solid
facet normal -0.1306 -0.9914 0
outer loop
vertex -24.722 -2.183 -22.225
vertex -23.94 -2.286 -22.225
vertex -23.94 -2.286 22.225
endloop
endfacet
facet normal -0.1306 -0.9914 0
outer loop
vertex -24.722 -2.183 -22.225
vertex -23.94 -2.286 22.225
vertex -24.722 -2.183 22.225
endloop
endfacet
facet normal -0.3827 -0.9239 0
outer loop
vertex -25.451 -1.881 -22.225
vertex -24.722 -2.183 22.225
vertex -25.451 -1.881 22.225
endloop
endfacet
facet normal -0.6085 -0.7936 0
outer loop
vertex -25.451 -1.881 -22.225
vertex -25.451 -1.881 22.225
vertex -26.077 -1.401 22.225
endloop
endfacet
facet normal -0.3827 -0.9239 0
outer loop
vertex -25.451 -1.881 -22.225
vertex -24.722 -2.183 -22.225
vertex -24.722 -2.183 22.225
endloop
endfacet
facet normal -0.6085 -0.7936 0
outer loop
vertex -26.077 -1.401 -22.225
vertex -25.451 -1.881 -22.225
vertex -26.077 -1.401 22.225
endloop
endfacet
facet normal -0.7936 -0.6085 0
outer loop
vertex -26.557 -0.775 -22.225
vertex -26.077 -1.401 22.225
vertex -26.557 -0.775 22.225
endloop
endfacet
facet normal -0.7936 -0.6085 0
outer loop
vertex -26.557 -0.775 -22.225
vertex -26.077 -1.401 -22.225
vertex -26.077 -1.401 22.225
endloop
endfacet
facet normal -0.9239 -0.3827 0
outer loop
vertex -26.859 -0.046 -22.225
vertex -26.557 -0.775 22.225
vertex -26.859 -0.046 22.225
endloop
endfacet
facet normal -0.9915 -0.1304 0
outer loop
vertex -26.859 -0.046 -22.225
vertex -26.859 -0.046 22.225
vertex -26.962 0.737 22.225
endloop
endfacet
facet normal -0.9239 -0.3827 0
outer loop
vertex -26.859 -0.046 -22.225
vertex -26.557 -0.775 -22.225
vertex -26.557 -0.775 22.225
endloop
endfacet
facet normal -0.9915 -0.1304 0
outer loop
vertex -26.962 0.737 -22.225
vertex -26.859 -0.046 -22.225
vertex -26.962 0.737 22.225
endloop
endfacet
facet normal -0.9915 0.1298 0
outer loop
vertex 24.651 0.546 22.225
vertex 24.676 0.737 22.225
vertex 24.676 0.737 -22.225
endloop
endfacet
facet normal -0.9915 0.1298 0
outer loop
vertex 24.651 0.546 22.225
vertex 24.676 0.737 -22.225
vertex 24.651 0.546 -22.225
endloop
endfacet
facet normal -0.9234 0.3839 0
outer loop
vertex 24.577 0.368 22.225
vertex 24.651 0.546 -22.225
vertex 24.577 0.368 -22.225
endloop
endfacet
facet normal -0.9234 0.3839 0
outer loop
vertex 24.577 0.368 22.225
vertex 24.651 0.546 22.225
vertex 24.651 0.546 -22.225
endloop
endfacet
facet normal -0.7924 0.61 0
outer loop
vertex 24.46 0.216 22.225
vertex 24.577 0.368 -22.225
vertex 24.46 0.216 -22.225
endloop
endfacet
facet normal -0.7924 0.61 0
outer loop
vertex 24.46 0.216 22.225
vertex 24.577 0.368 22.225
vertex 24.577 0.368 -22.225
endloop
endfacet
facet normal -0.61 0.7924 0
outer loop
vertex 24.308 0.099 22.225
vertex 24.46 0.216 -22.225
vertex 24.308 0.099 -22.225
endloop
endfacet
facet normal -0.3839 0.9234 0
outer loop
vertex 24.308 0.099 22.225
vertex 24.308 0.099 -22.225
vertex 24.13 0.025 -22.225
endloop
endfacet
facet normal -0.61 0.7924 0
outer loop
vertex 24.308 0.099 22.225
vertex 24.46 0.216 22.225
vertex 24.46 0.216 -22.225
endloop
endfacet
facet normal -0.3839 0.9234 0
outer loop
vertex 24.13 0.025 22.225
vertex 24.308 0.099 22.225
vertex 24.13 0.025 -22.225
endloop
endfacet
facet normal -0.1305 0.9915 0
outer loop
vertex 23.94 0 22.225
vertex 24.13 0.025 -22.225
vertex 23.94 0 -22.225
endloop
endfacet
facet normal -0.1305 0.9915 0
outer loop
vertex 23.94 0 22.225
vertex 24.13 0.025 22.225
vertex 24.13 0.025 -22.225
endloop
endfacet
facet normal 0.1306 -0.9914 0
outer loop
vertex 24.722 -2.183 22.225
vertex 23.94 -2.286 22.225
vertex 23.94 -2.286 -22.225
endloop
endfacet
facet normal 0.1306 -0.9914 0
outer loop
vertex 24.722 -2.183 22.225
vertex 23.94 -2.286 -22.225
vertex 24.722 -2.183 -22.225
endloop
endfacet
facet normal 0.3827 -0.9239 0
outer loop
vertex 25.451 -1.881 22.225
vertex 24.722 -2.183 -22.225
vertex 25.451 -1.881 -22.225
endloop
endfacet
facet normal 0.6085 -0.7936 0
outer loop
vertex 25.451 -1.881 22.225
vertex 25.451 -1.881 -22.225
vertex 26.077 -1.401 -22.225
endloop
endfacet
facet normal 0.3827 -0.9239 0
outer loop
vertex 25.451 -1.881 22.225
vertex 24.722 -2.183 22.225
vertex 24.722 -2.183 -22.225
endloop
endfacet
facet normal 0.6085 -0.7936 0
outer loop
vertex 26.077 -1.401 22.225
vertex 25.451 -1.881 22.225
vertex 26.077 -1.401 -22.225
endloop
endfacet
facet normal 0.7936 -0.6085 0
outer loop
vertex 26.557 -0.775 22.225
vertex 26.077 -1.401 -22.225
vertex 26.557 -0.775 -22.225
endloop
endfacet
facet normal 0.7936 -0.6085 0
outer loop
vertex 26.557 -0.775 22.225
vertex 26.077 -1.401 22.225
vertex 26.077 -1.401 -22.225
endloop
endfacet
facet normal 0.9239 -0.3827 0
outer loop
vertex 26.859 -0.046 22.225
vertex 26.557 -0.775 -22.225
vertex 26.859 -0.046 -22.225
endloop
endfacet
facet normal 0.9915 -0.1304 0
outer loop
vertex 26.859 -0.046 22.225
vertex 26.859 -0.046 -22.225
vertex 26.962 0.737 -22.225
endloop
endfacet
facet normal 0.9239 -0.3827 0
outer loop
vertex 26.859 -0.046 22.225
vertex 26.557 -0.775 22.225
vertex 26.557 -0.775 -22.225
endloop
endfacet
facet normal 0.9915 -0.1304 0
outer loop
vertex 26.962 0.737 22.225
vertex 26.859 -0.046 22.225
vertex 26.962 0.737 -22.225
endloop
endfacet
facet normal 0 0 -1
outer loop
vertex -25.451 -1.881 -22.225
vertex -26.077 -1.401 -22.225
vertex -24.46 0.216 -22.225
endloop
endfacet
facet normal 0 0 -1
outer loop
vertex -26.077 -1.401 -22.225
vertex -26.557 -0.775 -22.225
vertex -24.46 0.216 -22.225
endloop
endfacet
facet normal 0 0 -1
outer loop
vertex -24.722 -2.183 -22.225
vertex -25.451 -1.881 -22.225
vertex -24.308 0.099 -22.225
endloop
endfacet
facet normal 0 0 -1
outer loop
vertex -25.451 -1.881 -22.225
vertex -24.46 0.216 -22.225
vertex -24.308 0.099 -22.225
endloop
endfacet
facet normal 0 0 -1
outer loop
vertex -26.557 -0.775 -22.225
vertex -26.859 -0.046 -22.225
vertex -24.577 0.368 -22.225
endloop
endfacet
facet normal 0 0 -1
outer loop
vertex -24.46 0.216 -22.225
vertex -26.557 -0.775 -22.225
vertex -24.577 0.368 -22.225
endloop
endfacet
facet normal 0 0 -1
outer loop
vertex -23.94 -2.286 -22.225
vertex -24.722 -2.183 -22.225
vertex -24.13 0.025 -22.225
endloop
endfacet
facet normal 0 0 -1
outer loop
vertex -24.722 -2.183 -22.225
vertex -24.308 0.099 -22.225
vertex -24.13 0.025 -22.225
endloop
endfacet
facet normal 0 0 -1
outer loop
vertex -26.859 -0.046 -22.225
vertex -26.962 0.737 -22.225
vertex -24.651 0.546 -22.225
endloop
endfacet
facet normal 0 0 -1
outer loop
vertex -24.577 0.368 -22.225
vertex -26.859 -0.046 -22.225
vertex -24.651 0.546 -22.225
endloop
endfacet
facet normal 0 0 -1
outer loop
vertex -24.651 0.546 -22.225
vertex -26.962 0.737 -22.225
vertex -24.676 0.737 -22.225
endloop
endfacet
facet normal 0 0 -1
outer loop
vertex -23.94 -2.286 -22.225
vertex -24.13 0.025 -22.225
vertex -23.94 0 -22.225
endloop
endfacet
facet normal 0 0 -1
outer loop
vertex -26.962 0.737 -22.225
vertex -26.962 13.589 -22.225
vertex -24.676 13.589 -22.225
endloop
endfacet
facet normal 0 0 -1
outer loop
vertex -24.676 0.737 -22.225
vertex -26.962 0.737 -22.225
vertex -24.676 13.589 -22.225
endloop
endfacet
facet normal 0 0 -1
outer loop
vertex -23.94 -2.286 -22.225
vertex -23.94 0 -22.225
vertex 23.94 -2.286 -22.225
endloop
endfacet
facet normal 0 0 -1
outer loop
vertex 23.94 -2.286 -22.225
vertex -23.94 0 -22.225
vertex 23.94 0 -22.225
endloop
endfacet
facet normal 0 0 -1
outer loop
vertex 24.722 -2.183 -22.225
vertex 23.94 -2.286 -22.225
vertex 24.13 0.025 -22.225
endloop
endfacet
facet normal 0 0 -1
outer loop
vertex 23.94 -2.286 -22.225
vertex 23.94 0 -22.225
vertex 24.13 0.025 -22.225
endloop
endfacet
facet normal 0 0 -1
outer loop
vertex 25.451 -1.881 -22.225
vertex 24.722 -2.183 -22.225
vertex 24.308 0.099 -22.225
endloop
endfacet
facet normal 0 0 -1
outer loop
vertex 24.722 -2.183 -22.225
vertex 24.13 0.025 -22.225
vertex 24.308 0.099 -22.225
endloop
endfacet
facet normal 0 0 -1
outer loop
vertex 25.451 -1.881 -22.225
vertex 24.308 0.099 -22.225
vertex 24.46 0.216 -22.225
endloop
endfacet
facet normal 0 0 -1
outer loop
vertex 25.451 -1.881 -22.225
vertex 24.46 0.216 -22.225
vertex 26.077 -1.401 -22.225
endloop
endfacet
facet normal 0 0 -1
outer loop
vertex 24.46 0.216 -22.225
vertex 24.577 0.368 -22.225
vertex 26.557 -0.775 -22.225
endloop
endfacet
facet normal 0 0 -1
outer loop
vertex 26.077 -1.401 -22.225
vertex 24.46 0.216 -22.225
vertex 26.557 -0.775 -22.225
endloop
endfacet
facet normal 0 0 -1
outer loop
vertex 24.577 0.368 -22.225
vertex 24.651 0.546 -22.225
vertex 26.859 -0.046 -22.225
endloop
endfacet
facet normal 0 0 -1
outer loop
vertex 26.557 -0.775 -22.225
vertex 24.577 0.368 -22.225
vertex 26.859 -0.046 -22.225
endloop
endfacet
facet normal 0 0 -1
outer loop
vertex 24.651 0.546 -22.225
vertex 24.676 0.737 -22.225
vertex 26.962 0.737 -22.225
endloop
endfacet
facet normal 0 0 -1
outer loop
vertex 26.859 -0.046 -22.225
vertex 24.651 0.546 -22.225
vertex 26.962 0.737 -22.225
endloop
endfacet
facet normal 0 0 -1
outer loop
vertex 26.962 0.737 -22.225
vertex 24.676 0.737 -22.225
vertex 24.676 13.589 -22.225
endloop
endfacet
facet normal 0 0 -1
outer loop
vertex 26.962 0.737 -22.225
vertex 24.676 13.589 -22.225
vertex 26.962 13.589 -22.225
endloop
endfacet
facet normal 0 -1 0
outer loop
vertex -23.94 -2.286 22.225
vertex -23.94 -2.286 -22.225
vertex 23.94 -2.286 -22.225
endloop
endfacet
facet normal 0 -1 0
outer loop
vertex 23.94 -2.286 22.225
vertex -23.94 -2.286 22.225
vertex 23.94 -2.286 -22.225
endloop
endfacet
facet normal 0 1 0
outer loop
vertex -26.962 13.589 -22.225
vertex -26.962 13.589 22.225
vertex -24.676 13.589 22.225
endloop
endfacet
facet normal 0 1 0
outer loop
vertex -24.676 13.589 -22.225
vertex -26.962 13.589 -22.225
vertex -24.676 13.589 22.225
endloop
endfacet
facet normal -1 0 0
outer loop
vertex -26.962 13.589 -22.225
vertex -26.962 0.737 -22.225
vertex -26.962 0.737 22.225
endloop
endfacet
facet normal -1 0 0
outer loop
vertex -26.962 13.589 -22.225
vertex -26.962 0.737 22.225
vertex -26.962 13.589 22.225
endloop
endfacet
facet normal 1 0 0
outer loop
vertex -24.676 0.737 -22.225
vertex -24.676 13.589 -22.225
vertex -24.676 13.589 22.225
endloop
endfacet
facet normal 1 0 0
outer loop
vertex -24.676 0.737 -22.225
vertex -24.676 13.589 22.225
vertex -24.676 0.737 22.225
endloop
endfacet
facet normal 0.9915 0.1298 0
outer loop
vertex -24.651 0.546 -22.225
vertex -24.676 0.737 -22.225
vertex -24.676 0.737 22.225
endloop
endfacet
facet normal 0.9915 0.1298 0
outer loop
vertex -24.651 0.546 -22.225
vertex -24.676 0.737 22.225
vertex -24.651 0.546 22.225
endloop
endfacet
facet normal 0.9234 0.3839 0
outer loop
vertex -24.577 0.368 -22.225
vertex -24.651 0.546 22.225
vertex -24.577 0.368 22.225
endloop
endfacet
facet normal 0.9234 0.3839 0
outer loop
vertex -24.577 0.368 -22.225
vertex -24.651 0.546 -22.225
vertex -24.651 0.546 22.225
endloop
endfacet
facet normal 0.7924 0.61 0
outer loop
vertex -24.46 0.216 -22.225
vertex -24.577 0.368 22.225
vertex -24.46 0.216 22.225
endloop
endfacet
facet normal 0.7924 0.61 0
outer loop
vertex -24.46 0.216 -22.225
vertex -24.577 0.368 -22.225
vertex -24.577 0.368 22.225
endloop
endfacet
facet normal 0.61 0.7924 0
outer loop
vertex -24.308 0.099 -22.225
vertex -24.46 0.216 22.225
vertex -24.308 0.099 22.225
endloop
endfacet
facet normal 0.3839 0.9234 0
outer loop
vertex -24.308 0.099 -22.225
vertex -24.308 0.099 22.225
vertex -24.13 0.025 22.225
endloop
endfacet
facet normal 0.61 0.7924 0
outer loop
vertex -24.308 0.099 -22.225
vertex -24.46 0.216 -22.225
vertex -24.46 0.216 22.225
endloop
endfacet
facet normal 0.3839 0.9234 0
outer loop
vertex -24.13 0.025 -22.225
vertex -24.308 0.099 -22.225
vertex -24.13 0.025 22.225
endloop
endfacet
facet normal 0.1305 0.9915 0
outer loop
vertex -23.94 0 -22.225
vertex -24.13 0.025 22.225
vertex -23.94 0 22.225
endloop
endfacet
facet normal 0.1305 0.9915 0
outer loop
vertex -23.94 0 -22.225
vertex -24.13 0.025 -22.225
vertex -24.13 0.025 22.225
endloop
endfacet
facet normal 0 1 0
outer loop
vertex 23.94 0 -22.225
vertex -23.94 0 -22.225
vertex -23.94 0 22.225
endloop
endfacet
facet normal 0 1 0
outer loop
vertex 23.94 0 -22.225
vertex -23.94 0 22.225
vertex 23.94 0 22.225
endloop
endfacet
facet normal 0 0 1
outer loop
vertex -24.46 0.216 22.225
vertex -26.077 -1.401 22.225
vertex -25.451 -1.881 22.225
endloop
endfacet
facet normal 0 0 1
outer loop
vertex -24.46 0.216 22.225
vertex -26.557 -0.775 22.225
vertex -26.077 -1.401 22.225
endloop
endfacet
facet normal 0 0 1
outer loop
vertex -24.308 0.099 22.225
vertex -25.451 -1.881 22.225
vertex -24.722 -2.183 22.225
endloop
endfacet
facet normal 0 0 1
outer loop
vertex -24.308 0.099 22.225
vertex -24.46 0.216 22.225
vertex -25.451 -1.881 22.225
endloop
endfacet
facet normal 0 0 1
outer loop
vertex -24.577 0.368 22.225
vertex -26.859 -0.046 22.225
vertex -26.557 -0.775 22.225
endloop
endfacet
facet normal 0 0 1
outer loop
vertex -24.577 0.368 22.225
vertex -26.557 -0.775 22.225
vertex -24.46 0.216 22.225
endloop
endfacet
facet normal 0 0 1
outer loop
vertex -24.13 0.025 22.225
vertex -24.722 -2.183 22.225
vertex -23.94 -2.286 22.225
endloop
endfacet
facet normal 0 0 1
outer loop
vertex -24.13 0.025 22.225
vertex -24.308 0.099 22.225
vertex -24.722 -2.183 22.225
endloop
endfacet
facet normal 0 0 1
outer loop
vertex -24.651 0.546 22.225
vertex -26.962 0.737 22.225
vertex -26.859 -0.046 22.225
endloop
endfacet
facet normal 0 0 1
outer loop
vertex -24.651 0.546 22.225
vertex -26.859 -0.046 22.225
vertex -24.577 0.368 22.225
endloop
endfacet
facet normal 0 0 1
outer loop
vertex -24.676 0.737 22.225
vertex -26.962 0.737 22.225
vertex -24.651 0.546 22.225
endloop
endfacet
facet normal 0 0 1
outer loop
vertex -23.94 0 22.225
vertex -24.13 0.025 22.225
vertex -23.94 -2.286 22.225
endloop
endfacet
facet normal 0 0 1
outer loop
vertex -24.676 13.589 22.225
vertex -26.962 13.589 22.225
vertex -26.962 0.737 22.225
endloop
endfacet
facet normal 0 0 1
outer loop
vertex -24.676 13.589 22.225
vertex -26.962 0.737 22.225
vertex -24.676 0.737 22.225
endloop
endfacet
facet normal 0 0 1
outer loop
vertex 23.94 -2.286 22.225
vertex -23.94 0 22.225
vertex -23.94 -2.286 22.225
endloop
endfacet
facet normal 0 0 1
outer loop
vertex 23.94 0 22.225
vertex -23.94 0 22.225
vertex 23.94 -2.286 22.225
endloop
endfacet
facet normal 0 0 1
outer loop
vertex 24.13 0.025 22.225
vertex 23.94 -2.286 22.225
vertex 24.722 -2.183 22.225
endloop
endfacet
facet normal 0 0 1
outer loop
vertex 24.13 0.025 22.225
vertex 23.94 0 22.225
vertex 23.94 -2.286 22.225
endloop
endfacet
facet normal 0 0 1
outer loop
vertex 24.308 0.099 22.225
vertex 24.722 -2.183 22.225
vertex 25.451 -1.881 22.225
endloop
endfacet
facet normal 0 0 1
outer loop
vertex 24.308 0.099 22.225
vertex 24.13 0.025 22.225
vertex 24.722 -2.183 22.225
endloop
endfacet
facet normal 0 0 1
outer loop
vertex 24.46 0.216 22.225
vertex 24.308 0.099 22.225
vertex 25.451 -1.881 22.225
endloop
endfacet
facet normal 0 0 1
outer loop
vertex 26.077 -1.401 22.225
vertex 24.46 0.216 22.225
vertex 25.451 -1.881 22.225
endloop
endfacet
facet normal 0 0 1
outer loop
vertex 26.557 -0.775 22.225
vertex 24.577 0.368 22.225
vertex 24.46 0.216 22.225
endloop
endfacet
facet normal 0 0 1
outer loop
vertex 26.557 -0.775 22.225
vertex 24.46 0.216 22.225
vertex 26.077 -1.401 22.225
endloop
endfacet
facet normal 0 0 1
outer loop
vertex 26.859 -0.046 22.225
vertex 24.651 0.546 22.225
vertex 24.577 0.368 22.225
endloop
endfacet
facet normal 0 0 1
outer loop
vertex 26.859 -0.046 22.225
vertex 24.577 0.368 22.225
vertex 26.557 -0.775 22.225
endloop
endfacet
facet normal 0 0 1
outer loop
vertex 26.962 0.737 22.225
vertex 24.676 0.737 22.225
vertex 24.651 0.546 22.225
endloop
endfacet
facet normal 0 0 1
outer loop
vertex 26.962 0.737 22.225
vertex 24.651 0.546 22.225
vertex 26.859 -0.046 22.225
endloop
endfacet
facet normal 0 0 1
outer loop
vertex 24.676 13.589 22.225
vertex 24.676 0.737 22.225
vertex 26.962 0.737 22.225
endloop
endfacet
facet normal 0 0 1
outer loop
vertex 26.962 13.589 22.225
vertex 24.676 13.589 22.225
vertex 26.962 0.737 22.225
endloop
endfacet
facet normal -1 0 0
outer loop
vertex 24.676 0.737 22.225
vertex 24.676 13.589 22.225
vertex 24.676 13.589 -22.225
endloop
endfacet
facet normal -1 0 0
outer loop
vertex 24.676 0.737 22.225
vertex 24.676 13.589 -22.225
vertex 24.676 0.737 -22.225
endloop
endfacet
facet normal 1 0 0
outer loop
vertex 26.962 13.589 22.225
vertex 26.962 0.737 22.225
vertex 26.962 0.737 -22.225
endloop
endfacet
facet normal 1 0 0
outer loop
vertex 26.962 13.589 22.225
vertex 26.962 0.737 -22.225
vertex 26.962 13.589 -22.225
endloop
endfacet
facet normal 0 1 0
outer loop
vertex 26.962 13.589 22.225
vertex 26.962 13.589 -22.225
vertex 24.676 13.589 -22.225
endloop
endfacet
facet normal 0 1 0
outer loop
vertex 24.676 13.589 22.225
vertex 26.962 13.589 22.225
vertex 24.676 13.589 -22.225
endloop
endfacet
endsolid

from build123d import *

# Parameters (mm, degrees)
SKETCH1_W                      = 53.9242
SKETCH1_H                      = 44.45
BASE_FLANGE2_DEPTH             = 2.286
EDGE_FLANGE1_STRIP_W           = 10.6172
EDGE_FLANGE1_STRIP_H           = 2.286
EDGE_FLANGE1_STRIP_CUT_DEPTH   = 44.45
EDGE_FLANGE1_STRIP_2_W         = 10.6172
EDGE_FLANGE1_STRIP_2_H         = 2.286
EDGE_FLANGE1_STRIP_CUT_2_DEPTH = 44.45
EDGE_FLANGE1_DEPTH             = 44.45
EDGE_FLANGE1_BEND_DEPTH        = 44.45


# Sheet-metal steps are written as plain solids
with BuildPart() as part:
    # Sketch1 → Base-Flange2 (new body)
    with BuildSketch(Plane(origin=(0, 0, 0), x_dir=(1, 0, 0), z_dir=(0, 1, 0))):
        Rectangle(SKETCH1_W, SKETCH1_H)
    extrude(amount=-BASE_FLANGE2_DEPTH)

    # Edge-Flange1 strip (across the edge) → Edge-Flange1 strip cut (cut)
    with BuildSketch(Plane(origin=(-26.9621, 0, -22.225), x_dir=(1, 0, 0), z_dir=(0, 0, 1))):
        with Locations((-2.286, -1.143)):
            Rectangle(EDGE_FLANGE1_STRIP_W, EDGE_FLANGE1_STRIP_H)
    extrude(amount=EDGE_FLANGE1_STRIP_CUT_DEPTH, mode=Mode.SUBTRACT)

    # Edge-Flange1 strip 2 (across the edge) → Edge-Flange1 strip cut 2 (cut)
    with BuildSketch(Plane(origin=(26.9621, 0, 22.225), x_dir=(-1, 0, 0), z_dir=(0, 0, -1))):
        with Locations((-2.286, -1.143)):
            Rectangle(EDGE_FLANGE1_STRIP_2_W, EDGE_FLANGE1_STRIP_2_H)
    extrude(amount=EDGE_FLANGE1_STRIP_CUT_2_DEPTH, mode=Mode.SUBTRACT)

    # Edge-Flange1 section (across the edge) → Edge-Flange1 (add)
    with BuildSketch(Plane(origin=(-26.9621, 0, -22.225), x_dir=(1, 0, 0), z_dir=(0, 0, 1))):
        with BuildLine():
            Line((0, 0.7366), (0, 13.589))
            Line((0, 13.589), (2.286, 13.589))
            Line((2.286, 13.589), (2.286, 0.7366))
            ThreePointArc((2.286, 0.7366), (2.501745145, 0.215745145), (3.0226, 0))
            Line((3.0226, 0), (3.0226, -2.286))
            ThreePointArc((3.0226, -2.286), (0.885299043, -1.400700957), (0, 0.7366))
        make_face()
    extrude(amount=EDGE_FLANGE1_DEPTH)

    # Edge-Flange1 section 2 (across the edge) → Edge-Flange1 bend (add)
    with BuildSketch(Plane(origin=(26.9621, 0, 22.225), x_dir=(-1, 0, 0), z_dir=(0, 0, -1))):
        with BuildLine():
            Line((0, 0.7366), (0, 13.589))
            Line((0, 13.589), (2.286, 13.589))
            Line((2.286, 13.589), (2.286, 0.7366))
            ThreePointArc((2.286, 0.7366), (2.501745145, 0.215745145), (3.0226, 0))
            Line((3.0226, 0), (3.0226, -2.286))
            ThreePointArc((3.0226, -2.286), (0.885299043, -1.400700957), (0, 0.7366))
        make_face()
    extrude(amount=EDGE_FLANGE1_BEND_DEPTH)


solid = part.part
